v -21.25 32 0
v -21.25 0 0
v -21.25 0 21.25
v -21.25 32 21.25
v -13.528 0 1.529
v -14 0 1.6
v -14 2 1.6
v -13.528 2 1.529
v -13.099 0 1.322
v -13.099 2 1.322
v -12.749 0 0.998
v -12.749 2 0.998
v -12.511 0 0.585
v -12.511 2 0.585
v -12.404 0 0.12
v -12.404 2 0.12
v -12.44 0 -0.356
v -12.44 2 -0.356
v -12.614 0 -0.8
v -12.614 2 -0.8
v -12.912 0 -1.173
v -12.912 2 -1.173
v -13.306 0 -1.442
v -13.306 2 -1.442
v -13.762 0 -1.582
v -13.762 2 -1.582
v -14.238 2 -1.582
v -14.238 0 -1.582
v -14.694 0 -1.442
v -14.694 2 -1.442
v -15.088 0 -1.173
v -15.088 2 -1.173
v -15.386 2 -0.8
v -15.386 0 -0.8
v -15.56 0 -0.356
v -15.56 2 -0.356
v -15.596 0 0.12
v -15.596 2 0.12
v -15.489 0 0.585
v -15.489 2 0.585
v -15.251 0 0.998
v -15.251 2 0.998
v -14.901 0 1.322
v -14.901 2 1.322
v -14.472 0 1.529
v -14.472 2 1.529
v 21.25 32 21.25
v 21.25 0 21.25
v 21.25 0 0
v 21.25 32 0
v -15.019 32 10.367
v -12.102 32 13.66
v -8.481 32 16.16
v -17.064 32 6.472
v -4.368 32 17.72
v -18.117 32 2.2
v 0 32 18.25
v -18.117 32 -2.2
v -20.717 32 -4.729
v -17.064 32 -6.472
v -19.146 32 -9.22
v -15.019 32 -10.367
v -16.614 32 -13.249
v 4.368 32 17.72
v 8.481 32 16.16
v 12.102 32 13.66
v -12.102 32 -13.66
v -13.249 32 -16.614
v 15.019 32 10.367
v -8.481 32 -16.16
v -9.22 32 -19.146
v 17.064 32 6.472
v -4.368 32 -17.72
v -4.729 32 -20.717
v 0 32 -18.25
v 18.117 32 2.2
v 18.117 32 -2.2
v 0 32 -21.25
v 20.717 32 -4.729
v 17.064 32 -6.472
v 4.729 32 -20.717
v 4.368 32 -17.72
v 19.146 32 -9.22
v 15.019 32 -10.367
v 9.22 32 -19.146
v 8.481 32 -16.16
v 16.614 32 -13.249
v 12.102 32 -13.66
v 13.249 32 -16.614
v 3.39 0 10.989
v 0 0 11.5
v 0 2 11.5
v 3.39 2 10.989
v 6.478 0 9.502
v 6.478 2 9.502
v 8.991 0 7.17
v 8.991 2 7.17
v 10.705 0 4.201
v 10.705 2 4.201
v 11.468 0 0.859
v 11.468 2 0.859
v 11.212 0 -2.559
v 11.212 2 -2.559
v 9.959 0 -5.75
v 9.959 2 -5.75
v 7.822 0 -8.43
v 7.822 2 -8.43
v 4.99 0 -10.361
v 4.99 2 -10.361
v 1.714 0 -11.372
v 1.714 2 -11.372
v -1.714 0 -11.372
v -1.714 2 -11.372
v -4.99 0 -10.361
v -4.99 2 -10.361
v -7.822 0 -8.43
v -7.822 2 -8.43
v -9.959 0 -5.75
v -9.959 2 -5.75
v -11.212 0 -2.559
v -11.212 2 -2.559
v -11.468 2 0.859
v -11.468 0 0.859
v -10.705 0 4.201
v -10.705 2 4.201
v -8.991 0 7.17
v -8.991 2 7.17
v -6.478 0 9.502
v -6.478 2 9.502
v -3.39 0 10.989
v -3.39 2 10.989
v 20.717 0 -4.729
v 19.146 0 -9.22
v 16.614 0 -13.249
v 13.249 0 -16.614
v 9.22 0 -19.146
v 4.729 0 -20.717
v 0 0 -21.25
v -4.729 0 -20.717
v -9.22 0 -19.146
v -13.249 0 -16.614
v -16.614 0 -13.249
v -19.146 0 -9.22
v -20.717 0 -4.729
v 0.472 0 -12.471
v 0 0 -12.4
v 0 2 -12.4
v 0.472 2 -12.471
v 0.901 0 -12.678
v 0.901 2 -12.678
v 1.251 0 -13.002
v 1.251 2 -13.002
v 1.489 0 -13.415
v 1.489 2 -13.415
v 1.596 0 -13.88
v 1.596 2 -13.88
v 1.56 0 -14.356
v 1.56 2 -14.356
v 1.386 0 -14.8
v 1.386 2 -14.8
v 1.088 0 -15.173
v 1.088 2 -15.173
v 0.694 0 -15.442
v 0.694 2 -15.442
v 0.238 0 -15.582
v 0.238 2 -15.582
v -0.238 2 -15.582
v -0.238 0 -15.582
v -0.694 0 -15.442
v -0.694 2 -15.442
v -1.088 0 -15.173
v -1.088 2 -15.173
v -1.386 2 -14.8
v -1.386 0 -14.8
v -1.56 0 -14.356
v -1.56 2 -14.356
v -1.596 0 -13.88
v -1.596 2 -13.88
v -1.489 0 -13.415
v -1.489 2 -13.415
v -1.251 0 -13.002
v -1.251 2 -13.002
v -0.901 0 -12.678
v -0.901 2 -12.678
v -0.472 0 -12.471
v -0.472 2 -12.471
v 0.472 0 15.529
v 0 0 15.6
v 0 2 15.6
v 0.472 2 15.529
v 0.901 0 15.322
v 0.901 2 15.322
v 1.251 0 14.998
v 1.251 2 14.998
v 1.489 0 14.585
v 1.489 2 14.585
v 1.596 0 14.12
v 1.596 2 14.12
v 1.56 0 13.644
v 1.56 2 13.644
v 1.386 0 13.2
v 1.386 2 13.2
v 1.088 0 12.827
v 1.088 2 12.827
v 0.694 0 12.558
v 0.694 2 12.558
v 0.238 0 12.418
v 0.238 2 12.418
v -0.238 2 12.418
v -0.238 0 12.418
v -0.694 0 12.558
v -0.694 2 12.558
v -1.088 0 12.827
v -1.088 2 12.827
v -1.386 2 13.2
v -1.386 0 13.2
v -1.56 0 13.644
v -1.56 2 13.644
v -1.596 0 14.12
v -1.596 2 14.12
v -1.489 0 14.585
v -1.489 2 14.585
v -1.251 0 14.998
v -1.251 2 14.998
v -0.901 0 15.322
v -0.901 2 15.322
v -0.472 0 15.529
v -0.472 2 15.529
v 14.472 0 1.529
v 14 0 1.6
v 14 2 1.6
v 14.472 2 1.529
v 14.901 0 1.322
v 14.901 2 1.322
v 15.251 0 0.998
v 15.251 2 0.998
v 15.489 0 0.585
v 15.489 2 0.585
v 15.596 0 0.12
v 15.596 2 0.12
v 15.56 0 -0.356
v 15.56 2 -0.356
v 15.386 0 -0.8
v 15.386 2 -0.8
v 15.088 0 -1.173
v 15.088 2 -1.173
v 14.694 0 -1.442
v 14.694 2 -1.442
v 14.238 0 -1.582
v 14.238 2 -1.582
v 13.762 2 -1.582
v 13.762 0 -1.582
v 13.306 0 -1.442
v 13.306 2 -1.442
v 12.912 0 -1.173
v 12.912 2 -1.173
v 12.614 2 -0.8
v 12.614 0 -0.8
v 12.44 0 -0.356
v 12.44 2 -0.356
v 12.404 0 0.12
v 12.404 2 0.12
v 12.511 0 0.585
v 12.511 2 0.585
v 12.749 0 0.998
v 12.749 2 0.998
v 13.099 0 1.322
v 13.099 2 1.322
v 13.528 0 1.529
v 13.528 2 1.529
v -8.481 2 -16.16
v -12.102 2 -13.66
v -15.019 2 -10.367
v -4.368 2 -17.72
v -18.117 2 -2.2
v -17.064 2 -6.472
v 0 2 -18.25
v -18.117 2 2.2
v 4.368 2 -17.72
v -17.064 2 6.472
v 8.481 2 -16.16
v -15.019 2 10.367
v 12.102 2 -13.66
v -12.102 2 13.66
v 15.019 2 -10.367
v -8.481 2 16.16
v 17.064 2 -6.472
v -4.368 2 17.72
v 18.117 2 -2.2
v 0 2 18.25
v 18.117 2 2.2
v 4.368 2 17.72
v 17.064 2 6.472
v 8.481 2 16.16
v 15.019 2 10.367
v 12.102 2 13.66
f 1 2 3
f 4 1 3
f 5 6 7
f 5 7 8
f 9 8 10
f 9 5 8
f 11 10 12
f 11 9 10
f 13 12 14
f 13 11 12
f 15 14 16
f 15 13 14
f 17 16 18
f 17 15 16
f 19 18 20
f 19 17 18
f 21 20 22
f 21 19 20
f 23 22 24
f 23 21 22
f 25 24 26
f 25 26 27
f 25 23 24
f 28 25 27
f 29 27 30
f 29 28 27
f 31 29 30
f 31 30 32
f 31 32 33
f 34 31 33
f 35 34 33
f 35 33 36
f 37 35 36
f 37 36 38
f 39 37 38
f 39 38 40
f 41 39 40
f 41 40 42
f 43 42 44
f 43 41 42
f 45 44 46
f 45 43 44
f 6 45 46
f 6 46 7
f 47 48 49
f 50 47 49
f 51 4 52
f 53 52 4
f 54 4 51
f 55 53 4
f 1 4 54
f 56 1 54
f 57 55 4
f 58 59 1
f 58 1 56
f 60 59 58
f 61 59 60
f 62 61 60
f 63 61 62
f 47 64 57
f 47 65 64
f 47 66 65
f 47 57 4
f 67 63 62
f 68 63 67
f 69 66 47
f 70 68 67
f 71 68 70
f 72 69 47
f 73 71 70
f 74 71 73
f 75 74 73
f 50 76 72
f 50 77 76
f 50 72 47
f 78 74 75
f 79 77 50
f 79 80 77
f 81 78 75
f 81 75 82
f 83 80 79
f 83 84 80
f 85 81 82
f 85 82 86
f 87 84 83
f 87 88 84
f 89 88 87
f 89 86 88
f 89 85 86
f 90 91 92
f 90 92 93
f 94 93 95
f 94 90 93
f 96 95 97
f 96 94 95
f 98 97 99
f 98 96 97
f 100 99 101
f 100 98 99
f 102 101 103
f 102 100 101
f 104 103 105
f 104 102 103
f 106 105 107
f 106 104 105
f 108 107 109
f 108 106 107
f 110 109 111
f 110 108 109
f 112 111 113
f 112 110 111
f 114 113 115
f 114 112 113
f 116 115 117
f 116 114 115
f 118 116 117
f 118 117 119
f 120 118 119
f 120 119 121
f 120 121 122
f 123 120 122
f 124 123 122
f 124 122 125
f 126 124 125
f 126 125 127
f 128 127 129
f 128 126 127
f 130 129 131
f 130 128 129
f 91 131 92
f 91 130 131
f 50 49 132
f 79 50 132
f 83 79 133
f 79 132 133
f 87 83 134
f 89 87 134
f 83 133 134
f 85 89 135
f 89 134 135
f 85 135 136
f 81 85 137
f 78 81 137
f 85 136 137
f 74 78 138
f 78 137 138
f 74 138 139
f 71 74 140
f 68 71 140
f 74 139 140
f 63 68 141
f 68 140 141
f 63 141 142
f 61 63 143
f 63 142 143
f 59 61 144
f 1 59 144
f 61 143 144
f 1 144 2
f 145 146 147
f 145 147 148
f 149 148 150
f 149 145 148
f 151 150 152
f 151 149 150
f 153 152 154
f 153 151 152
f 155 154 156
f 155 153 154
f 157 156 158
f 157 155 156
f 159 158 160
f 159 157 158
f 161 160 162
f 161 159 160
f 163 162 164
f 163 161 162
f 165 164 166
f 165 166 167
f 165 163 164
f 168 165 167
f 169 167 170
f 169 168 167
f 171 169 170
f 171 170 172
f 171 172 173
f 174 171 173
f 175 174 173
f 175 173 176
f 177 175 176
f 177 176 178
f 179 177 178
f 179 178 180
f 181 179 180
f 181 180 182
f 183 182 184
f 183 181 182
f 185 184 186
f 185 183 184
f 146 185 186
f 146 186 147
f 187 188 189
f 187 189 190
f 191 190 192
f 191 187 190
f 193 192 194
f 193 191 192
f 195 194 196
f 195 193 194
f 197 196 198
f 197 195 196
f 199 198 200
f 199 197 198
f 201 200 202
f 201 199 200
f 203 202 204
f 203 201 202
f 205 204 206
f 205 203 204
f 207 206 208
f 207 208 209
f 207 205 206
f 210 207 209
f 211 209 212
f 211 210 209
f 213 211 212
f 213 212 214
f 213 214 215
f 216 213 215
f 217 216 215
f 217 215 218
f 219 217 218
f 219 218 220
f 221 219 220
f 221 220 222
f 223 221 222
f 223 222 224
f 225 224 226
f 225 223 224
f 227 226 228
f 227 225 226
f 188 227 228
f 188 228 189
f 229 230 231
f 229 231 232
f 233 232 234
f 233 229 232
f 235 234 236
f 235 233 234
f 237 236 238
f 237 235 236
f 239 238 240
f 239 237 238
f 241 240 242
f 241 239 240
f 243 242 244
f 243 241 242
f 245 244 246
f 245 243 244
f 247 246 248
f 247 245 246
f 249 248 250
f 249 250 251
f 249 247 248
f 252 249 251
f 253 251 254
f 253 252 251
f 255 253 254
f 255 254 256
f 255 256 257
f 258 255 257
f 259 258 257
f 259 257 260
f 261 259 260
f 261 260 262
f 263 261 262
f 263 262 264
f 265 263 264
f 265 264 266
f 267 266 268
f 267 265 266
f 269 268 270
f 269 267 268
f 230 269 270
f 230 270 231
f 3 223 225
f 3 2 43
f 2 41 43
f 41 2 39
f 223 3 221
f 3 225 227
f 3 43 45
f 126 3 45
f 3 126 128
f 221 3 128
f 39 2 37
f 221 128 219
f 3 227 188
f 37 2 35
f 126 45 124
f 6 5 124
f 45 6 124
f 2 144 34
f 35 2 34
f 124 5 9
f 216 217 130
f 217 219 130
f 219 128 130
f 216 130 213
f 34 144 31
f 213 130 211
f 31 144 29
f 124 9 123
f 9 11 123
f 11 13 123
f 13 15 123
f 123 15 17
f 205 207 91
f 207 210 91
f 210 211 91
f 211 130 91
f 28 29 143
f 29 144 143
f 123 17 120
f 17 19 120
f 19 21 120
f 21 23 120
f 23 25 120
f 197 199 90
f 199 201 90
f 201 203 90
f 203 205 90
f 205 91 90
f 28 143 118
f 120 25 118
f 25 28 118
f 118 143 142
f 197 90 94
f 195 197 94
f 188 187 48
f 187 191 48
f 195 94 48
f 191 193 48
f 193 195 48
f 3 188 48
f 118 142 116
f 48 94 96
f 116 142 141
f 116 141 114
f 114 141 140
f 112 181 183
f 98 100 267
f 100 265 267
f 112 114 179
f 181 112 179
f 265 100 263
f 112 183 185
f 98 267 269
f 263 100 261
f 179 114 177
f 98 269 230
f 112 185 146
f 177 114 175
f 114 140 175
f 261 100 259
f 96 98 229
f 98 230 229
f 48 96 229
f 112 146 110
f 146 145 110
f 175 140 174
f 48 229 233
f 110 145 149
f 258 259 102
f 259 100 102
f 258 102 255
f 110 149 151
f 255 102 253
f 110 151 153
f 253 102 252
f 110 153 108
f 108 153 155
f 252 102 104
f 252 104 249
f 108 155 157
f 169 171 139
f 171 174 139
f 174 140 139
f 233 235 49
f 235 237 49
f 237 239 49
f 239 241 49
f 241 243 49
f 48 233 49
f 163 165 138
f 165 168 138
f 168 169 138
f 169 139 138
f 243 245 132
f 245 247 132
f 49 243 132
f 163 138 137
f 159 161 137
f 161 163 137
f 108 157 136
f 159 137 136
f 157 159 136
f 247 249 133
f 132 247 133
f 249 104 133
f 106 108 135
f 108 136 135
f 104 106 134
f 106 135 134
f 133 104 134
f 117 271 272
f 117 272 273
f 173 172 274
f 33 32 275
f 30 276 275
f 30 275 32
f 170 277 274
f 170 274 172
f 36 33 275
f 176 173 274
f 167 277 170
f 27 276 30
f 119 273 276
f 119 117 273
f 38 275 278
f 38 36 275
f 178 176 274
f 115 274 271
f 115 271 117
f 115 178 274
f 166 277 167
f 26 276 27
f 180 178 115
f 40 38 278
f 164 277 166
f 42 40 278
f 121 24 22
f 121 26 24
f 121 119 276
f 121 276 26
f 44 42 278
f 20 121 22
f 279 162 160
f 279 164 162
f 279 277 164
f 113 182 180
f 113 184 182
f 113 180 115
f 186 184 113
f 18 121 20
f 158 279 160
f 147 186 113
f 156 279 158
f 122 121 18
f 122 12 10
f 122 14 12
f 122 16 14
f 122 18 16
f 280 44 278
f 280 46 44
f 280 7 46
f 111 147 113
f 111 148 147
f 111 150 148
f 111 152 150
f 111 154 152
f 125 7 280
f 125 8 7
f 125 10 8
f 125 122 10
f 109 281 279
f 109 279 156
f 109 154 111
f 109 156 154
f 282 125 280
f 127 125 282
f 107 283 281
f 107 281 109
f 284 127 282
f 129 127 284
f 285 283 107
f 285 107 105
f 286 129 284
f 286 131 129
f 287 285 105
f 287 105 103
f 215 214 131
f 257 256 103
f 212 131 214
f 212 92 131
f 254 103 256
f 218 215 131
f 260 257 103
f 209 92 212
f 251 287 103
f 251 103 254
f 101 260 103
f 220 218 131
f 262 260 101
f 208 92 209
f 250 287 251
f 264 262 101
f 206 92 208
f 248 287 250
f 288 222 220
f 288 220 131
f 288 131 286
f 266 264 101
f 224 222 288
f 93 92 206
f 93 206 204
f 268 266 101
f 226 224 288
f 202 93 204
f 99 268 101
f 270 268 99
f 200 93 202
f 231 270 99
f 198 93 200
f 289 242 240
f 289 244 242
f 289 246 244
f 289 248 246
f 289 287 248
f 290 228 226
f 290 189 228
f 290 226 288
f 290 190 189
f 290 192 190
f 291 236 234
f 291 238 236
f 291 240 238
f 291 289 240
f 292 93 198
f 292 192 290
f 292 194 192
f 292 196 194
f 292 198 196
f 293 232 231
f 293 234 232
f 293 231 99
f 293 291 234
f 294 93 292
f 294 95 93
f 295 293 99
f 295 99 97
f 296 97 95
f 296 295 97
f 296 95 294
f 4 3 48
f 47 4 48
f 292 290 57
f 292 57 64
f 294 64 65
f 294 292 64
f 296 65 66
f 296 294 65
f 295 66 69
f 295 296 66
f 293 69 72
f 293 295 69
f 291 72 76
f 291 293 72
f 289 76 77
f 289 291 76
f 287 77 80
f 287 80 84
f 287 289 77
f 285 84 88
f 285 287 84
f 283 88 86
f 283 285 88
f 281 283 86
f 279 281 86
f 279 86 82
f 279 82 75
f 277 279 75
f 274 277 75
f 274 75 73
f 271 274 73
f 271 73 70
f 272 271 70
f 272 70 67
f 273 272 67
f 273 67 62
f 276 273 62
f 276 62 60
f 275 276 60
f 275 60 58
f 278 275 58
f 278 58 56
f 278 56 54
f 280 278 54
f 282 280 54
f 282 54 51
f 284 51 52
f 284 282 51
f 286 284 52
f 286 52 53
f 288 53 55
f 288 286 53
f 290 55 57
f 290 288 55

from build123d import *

# Parameters (mm, degrees)
SKETCH1_R           = 18.25
SKETCH1_R_2         = 1.6
SKETCH1_R_3         = 11.5
BOSS_EXTRUDE1_DEPTH = 2
SKETCH1_3_R         = 21.25
SKETCH1_3_R_2       = 18.25
BOSS_EXTRUDE2_DEPTH = 32
BOSS_EXTRUDE3_DEPTH = 32


with BuildPart() as part:
    # Sketch1 → Boss-Extrude1 (new body)
    with BuildSketch(Plane(origin=(0, 0, 0), x_dir=(1, 0, 0), z_dir=(0, 1, 0))):
        Circle(SKETCH1_R)
        with Locations((-14, 0)):
            Circle(SKETCH1_R_2, mode=Mode.SUBTRACT)
        with Locations((0, -14)):
            Circle(SKETCH1_R_2, mode=Mode.SUBTRACT)
        Circle(SKETCH1_R_3, mode=Mode.SUBTRACT)
        with Locations((14, 0)):
            Circle(SKETCH1_R_2, mode=Mode.SUBTRACT)
        with Locations((0, 14)):
            Circle(SKETCH1_R_2, mode=Mode.SUBTRACT)
    extrude(amount=BOSS_EXTRUDE1_DEPTH)

    # Sketch1<3> → Boss-Extrude2 (add)
    with BuildSketch(Plane(origin=(0, 0, 0), x_dir=(1, 0, 0), z_dir=(0, 1, 0))):
        Circle(SKETCH1_3_R)
        Circle(SKETCH1_3_R_2, mode=Mode.SUBTRACT)
    extrude(amount=BOSS_EXTRUDE2_DEPTH)

    # Sketch2 → Boss-Extrude3 (add)
    with BuildSketch(Plane(origin=(0, 0, 0), x_dir=(1, 0, 0), z_dir=(0, 1, 0))):
        with BuildLine():
            ThreePointArc((5.4e-08, -21.25), (-15.026019081, -15.026019119), (-21.25, 0))
            Line((-21.25, 0), (-21.25, -21.25))
            Line((-21.25, -21.25), (5.4e-08, -21.25))
        make_face()
        with BuildLine():
            Line((21.25, -21.25), (21.25, 0))
            ThreePointArc((21.25, 0), (15.026019119, -15.026019081), (5.4e-08, -21.25))
            Line((5.4e-08, -21.25), (21.25, -21.25))
        make_face()
    extrude(amount=BOSS_EXTRUDE3_DEPTH)


solid = part.part
